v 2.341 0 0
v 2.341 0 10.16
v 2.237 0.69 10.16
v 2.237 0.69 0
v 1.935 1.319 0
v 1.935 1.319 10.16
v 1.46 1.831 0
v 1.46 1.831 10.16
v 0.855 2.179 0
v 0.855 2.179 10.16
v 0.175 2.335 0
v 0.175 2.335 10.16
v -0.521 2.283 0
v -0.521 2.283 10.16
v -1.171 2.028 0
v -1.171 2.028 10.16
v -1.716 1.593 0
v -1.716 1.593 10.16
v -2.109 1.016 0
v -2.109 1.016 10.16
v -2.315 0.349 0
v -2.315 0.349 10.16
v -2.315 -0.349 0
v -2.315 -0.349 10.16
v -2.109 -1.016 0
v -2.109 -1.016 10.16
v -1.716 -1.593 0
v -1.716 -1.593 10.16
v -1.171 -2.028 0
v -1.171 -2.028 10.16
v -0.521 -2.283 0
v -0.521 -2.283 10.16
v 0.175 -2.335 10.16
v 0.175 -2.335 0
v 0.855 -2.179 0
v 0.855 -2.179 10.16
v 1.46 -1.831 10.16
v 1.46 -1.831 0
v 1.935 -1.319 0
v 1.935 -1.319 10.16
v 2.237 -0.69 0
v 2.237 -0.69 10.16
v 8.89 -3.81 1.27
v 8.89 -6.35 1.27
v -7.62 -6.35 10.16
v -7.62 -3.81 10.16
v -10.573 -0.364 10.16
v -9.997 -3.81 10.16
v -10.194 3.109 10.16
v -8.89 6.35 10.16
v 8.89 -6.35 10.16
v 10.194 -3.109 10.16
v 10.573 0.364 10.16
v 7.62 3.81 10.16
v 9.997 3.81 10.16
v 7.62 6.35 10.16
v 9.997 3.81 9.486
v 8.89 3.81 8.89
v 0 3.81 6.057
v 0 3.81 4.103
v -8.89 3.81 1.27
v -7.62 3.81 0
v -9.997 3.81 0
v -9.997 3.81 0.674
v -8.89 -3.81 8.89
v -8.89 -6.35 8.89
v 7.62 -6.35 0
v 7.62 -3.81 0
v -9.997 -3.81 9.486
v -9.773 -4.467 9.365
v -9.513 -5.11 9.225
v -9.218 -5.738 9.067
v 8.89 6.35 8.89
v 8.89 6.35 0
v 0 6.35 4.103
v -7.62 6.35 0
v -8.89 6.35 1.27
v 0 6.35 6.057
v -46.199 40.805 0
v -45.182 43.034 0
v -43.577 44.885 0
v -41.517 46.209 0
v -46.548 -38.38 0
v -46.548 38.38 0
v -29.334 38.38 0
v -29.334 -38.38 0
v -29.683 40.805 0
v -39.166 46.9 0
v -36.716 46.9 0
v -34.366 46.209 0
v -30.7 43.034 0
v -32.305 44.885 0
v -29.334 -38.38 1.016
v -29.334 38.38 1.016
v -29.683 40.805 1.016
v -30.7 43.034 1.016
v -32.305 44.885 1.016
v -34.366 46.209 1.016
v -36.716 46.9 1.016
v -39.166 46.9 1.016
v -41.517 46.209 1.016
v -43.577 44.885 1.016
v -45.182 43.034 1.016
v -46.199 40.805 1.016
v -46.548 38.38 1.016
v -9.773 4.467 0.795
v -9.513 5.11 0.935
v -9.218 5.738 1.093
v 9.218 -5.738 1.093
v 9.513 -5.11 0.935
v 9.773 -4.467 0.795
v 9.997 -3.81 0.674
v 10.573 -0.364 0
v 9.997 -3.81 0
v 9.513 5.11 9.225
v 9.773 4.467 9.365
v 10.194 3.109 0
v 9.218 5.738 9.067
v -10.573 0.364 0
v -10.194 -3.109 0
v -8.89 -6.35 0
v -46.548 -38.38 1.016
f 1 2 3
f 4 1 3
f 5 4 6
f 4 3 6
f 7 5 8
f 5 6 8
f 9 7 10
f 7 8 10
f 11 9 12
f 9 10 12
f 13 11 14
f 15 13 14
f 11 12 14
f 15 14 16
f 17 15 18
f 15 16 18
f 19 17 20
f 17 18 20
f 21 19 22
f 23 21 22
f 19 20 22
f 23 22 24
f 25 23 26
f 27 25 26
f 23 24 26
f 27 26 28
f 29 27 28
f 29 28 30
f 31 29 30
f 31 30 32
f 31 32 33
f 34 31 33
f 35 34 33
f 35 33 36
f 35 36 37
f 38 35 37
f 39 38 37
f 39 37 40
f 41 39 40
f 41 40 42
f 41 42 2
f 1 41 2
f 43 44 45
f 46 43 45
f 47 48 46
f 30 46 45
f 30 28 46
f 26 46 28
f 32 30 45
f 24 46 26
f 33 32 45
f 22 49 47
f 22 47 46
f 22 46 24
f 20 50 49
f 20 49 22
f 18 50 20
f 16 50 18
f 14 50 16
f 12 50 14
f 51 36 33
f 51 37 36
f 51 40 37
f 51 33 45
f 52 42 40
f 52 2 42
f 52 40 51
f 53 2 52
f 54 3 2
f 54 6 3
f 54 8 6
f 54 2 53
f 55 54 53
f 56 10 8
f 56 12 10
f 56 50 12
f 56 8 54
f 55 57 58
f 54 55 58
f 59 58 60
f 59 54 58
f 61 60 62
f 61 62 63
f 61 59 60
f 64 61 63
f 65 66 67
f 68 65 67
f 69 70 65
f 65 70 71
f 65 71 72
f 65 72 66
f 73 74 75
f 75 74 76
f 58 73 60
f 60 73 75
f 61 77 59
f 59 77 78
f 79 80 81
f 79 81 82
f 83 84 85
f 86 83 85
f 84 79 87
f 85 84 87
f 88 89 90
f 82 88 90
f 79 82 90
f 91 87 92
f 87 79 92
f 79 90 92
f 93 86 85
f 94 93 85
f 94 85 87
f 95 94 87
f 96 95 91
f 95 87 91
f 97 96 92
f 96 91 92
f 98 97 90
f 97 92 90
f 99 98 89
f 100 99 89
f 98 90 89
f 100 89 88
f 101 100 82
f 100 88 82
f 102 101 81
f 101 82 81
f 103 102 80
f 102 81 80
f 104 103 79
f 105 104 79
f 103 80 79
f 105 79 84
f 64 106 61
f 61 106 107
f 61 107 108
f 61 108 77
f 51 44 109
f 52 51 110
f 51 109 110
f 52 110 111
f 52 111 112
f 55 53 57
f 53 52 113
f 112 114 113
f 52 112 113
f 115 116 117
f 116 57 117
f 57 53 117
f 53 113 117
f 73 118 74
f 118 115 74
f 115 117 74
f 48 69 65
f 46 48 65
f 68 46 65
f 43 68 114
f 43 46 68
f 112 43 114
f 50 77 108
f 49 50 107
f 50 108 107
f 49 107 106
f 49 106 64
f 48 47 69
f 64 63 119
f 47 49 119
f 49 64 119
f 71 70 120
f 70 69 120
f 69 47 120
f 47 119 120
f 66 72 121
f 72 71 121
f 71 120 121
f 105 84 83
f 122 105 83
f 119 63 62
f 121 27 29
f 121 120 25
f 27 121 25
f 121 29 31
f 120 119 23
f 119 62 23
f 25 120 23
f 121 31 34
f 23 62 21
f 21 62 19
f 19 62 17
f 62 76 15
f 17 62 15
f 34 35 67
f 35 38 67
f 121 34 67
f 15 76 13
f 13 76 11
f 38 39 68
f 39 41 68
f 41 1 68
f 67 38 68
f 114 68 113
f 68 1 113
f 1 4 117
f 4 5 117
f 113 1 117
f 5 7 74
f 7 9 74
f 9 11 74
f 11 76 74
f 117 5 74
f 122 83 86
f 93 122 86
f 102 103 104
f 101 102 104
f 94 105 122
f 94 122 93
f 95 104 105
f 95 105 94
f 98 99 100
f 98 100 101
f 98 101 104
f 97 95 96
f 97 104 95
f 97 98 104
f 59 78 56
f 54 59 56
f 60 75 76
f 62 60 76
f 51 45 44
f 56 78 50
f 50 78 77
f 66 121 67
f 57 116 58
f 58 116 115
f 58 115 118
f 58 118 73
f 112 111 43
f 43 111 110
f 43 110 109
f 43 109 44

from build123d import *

# Parameters (mm, degrees)
F1_DEPTH = 10.16
F3_DEPTH = 2.54
F5_DEPTH = 2.54
F6_R     = 2.341346142
F7_DEPTH = 10.161
F9_DEPTH = 1.016


# Not quite as in the source:
# - a feature names something its author has since deleted; it is built from what else it names


with BuildPart() as f1:
    # F0 (on Top) → F1 (new body)
    with BuildSketch(Plane.XY):
        with BuildLine():
            ThreePointArc((-8.89, 6.35), (-10.5782148046, 0), (-8.89, -6.35))
            Line((-8.89, -6.35), (0, -6.35))
            Line((0, -6.35), (0, 6.35))
            Line((0, 6.35), (-8.89, 6.35))
        make_face()
        with BuildLine():
            Line((0, 6.35), (0, -6.35))
            Line((0, -6.35), (8.89, -6.35))
            ThreePointArc((8.89, -6.35), (10.5782148046, 0), (8.89, 6.35))
            Line((8.89, 6.35), (0, 6.35))
        make_face()
    extrude(amount=F1_DEPTH)

    # F2 (on face) → F3 (cut)
    with BuildSketch(Plane.XZ.offset(6.35)):
        Polygon((11.2485714286, 0), (8.89, 1.27), (-7.62, 10.16), (-8.89, 10.16), (-11.2485714286, 10.16), (-8.89, 8.89), (7.62, 0), (8.89, 0), align=None)
    extrude(amount=-F3_DEPTH, mode=Mode.SUBTRACT)

    # F4 (on face) → F5 (cut)
    with BuildSketch(Plane(origin=(0, 6.35, 0), x_dir=(-1, 0, 0), z_dir=(0, 1, 0))):
        Polygon((8.89, 1.27), (0, 6.0569230769), (0, 4.1030769231), (7.62, 0), (11.2485714286, 0), align=None)
        Polygon((0, 4.1030769231), (0, 6.0569230769), (-7.62, 10.16), (-11.2485714286, 10.16), (-8.89, 8.89), align=None)
    extrude(amount=-F5_DEPTH, mode=Mode.SUBTRACT)

    # F6 (on face) → F7 (cut, through all)
    with BuildSketch(Plane.XY.offset(10.16)):
        Circle(F6_R)
    extrude(amount=-F7_DEPTH, mode=Mode.SUBTRACT)


with BuildPart() as f9:
    # F8 (on Top) → F9 (new body)
    with BuildSketch(Plane.XY):
        with BuildLine():
            Line((-46.5480796993, 38.3802093565), (-46.5480796993, -38.3802093565))
            Line((-46.5480796993, -38.3802093565), (-29.3340720236, -38.3802093565))
            Line((-29.3340720236, -38.3802093565), (-29.3340720236, 38.3802093565))
            ThreePointArc((-29.3340720236, 38.3802093565), (-37.9410758615, 46.9872131944), (-46.5480796993, 38.3802093565))
        make_face()
    extrude(amount=F9_DEPTH)


solid = Compound([f1.part, f9.part])
